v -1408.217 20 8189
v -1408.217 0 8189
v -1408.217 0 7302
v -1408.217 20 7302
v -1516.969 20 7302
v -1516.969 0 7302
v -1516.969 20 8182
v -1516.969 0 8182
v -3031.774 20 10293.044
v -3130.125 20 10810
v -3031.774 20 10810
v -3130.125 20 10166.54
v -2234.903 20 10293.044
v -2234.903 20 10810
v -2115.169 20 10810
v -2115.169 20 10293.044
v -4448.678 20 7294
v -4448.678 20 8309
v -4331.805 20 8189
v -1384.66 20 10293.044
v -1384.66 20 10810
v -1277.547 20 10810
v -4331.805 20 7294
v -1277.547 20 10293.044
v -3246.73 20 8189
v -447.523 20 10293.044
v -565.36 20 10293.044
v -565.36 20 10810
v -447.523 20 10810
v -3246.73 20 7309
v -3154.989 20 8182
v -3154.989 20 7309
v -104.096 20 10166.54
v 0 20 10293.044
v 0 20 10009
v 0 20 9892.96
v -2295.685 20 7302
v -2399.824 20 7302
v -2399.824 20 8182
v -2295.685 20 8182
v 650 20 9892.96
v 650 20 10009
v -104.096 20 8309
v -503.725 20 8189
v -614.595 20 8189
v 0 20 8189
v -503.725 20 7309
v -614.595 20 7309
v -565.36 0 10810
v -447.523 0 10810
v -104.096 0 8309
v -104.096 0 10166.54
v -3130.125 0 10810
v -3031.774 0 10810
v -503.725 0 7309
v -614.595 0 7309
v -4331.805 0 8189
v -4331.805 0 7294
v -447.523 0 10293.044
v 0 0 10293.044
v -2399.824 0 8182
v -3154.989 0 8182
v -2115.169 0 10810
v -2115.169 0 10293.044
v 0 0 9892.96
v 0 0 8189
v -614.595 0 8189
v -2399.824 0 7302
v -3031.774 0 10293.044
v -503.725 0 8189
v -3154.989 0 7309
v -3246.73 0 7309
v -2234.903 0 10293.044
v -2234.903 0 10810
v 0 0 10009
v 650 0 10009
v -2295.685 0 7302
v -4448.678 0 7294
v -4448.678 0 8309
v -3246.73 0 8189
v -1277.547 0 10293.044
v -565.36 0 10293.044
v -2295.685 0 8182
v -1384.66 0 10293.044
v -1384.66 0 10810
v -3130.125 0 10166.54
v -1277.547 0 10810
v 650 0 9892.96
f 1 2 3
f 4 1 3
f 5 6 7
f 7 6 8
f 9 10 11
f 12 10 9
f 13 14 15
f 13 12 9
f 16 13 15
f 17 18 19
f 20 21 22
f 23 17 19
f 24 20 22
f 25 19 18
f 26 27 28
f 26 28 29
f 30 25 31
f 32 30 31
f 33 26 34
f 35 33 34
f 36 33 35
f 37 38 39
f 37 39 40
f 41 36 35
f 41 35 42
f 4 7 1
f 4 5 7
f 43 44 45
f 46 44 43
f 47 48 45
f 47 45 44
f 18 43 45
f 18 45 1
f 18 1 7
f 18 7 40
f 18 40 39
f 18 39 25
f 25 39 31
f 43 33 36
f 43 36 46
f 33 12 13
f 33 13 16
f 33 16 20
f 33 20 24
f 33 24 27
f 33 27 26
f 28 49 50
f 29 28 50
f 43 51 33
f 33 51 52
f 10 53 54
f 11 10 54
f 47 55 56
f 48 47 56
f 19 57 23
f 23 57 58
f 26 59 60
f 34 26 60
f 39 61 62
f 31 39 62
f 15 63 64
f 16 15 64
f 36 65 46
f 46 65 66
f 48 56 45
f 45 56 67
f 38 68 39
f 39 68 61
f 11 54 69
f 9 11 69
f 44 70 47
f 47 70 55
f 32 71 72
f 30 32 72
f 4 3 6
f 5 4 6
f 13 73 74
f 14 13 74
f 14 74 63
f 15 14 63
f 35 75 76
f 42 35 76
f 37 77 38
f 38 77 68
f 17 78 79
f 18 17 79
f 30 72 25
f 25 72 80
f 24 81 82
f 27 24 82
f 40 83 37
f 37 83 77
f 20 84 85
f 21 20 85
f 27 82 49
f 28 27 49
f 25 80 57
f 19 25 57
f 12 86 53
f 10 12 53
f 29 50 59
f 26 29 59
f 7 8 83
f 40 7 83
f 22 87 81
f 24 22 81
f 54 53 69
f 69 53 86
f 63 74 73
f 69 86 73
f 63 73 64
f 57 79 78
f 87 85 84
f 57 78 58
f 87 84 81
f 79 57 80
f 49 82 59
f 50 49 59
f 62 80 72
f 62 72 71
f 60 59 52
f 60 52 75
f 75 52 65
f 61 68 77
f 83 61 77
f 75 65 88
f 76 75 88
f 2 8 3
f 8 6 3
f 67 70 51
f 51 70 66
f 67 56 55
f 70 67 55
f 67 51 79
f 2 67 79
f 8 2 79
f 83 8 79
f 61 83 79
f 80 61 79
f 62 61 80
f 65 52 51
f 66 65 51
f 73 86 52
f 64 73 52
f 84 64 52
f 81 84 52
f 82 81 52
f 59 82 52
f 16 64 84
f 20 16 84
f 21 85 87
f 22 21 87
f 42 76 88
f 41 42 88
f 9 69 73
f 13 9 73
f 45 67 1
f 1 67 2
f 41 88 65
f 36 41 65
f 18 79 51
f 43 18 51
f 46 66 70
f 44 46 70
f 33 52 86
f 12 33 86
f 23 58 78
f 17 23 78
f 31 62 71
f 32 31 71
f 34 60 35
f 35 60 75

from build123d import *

# Parameters (mm, degrees)
SALIENTE_EXTRUIR1_DEPTH = 20


with BuildPart() as part:
    # Croquis1 → Saliente-Extruir1 (new body)
    with BuildSketch(Plane(origin=(0, 0, 0), x_dir=(1, 0, 0), z_dir=(0, 1, 0))):
        Polygon((-4448.678195779, -7294), (-4448.678195779, -8309), (-503.724981637, -8309), (-104.09646946, -8309), (-104.09646946, -10009), (-104.09646946, -10166.539756835), (-3130.125280174, -10166.539756835), (-3130.125280174, -10810), (-3031.77401608, -10810), (-3031.77401608, -10293.043552141), (-2234.903210462, -10293.043552141), (-2234.903210462, -10810), (-2115.169242354, -10810), (-2115.169242354, -10293.043552141), (-1384.659557399, -10293.043552141), (-1384.659557399, -10810), (-1277.546786748, -10810), (-1277.546786748, -10293.043552141), (-565.360320281, -10293.043552141), (-565.360320281, -10810), (-447.522754169, -10810), (-447.522754169, -10293.043552141), (0, -10293.043552141), (0, -10009), (650, -10009), (650, -9892.960428294), (0, -9892.960428294), (0, -8189), (-503.724981637, -8189), (-503.724981637, -7309), (-614.594937337, -7309), (-614.594937337, -8189), (-1408.216581964, -8189), (-1408.216581964, -7302), (-1516.96854741, -7302), (-1516.96854741, -8182), (-2295.685468291, -8182), (-2295.685468291, -7302), (-2399.823761144, -7302), (-2399.823761144, -8182), (-3154.988725165, -8182), (-3154.988725165, -7309), (-3246.729822708, -7309), (-3246.729822708, -8189), (-4331.805284711, -8189), (-4331.805284711, -7294), align=None)
    extrude(amount=SALIENTE_EXTRUIR1_DEPTH)


solid = part.part
